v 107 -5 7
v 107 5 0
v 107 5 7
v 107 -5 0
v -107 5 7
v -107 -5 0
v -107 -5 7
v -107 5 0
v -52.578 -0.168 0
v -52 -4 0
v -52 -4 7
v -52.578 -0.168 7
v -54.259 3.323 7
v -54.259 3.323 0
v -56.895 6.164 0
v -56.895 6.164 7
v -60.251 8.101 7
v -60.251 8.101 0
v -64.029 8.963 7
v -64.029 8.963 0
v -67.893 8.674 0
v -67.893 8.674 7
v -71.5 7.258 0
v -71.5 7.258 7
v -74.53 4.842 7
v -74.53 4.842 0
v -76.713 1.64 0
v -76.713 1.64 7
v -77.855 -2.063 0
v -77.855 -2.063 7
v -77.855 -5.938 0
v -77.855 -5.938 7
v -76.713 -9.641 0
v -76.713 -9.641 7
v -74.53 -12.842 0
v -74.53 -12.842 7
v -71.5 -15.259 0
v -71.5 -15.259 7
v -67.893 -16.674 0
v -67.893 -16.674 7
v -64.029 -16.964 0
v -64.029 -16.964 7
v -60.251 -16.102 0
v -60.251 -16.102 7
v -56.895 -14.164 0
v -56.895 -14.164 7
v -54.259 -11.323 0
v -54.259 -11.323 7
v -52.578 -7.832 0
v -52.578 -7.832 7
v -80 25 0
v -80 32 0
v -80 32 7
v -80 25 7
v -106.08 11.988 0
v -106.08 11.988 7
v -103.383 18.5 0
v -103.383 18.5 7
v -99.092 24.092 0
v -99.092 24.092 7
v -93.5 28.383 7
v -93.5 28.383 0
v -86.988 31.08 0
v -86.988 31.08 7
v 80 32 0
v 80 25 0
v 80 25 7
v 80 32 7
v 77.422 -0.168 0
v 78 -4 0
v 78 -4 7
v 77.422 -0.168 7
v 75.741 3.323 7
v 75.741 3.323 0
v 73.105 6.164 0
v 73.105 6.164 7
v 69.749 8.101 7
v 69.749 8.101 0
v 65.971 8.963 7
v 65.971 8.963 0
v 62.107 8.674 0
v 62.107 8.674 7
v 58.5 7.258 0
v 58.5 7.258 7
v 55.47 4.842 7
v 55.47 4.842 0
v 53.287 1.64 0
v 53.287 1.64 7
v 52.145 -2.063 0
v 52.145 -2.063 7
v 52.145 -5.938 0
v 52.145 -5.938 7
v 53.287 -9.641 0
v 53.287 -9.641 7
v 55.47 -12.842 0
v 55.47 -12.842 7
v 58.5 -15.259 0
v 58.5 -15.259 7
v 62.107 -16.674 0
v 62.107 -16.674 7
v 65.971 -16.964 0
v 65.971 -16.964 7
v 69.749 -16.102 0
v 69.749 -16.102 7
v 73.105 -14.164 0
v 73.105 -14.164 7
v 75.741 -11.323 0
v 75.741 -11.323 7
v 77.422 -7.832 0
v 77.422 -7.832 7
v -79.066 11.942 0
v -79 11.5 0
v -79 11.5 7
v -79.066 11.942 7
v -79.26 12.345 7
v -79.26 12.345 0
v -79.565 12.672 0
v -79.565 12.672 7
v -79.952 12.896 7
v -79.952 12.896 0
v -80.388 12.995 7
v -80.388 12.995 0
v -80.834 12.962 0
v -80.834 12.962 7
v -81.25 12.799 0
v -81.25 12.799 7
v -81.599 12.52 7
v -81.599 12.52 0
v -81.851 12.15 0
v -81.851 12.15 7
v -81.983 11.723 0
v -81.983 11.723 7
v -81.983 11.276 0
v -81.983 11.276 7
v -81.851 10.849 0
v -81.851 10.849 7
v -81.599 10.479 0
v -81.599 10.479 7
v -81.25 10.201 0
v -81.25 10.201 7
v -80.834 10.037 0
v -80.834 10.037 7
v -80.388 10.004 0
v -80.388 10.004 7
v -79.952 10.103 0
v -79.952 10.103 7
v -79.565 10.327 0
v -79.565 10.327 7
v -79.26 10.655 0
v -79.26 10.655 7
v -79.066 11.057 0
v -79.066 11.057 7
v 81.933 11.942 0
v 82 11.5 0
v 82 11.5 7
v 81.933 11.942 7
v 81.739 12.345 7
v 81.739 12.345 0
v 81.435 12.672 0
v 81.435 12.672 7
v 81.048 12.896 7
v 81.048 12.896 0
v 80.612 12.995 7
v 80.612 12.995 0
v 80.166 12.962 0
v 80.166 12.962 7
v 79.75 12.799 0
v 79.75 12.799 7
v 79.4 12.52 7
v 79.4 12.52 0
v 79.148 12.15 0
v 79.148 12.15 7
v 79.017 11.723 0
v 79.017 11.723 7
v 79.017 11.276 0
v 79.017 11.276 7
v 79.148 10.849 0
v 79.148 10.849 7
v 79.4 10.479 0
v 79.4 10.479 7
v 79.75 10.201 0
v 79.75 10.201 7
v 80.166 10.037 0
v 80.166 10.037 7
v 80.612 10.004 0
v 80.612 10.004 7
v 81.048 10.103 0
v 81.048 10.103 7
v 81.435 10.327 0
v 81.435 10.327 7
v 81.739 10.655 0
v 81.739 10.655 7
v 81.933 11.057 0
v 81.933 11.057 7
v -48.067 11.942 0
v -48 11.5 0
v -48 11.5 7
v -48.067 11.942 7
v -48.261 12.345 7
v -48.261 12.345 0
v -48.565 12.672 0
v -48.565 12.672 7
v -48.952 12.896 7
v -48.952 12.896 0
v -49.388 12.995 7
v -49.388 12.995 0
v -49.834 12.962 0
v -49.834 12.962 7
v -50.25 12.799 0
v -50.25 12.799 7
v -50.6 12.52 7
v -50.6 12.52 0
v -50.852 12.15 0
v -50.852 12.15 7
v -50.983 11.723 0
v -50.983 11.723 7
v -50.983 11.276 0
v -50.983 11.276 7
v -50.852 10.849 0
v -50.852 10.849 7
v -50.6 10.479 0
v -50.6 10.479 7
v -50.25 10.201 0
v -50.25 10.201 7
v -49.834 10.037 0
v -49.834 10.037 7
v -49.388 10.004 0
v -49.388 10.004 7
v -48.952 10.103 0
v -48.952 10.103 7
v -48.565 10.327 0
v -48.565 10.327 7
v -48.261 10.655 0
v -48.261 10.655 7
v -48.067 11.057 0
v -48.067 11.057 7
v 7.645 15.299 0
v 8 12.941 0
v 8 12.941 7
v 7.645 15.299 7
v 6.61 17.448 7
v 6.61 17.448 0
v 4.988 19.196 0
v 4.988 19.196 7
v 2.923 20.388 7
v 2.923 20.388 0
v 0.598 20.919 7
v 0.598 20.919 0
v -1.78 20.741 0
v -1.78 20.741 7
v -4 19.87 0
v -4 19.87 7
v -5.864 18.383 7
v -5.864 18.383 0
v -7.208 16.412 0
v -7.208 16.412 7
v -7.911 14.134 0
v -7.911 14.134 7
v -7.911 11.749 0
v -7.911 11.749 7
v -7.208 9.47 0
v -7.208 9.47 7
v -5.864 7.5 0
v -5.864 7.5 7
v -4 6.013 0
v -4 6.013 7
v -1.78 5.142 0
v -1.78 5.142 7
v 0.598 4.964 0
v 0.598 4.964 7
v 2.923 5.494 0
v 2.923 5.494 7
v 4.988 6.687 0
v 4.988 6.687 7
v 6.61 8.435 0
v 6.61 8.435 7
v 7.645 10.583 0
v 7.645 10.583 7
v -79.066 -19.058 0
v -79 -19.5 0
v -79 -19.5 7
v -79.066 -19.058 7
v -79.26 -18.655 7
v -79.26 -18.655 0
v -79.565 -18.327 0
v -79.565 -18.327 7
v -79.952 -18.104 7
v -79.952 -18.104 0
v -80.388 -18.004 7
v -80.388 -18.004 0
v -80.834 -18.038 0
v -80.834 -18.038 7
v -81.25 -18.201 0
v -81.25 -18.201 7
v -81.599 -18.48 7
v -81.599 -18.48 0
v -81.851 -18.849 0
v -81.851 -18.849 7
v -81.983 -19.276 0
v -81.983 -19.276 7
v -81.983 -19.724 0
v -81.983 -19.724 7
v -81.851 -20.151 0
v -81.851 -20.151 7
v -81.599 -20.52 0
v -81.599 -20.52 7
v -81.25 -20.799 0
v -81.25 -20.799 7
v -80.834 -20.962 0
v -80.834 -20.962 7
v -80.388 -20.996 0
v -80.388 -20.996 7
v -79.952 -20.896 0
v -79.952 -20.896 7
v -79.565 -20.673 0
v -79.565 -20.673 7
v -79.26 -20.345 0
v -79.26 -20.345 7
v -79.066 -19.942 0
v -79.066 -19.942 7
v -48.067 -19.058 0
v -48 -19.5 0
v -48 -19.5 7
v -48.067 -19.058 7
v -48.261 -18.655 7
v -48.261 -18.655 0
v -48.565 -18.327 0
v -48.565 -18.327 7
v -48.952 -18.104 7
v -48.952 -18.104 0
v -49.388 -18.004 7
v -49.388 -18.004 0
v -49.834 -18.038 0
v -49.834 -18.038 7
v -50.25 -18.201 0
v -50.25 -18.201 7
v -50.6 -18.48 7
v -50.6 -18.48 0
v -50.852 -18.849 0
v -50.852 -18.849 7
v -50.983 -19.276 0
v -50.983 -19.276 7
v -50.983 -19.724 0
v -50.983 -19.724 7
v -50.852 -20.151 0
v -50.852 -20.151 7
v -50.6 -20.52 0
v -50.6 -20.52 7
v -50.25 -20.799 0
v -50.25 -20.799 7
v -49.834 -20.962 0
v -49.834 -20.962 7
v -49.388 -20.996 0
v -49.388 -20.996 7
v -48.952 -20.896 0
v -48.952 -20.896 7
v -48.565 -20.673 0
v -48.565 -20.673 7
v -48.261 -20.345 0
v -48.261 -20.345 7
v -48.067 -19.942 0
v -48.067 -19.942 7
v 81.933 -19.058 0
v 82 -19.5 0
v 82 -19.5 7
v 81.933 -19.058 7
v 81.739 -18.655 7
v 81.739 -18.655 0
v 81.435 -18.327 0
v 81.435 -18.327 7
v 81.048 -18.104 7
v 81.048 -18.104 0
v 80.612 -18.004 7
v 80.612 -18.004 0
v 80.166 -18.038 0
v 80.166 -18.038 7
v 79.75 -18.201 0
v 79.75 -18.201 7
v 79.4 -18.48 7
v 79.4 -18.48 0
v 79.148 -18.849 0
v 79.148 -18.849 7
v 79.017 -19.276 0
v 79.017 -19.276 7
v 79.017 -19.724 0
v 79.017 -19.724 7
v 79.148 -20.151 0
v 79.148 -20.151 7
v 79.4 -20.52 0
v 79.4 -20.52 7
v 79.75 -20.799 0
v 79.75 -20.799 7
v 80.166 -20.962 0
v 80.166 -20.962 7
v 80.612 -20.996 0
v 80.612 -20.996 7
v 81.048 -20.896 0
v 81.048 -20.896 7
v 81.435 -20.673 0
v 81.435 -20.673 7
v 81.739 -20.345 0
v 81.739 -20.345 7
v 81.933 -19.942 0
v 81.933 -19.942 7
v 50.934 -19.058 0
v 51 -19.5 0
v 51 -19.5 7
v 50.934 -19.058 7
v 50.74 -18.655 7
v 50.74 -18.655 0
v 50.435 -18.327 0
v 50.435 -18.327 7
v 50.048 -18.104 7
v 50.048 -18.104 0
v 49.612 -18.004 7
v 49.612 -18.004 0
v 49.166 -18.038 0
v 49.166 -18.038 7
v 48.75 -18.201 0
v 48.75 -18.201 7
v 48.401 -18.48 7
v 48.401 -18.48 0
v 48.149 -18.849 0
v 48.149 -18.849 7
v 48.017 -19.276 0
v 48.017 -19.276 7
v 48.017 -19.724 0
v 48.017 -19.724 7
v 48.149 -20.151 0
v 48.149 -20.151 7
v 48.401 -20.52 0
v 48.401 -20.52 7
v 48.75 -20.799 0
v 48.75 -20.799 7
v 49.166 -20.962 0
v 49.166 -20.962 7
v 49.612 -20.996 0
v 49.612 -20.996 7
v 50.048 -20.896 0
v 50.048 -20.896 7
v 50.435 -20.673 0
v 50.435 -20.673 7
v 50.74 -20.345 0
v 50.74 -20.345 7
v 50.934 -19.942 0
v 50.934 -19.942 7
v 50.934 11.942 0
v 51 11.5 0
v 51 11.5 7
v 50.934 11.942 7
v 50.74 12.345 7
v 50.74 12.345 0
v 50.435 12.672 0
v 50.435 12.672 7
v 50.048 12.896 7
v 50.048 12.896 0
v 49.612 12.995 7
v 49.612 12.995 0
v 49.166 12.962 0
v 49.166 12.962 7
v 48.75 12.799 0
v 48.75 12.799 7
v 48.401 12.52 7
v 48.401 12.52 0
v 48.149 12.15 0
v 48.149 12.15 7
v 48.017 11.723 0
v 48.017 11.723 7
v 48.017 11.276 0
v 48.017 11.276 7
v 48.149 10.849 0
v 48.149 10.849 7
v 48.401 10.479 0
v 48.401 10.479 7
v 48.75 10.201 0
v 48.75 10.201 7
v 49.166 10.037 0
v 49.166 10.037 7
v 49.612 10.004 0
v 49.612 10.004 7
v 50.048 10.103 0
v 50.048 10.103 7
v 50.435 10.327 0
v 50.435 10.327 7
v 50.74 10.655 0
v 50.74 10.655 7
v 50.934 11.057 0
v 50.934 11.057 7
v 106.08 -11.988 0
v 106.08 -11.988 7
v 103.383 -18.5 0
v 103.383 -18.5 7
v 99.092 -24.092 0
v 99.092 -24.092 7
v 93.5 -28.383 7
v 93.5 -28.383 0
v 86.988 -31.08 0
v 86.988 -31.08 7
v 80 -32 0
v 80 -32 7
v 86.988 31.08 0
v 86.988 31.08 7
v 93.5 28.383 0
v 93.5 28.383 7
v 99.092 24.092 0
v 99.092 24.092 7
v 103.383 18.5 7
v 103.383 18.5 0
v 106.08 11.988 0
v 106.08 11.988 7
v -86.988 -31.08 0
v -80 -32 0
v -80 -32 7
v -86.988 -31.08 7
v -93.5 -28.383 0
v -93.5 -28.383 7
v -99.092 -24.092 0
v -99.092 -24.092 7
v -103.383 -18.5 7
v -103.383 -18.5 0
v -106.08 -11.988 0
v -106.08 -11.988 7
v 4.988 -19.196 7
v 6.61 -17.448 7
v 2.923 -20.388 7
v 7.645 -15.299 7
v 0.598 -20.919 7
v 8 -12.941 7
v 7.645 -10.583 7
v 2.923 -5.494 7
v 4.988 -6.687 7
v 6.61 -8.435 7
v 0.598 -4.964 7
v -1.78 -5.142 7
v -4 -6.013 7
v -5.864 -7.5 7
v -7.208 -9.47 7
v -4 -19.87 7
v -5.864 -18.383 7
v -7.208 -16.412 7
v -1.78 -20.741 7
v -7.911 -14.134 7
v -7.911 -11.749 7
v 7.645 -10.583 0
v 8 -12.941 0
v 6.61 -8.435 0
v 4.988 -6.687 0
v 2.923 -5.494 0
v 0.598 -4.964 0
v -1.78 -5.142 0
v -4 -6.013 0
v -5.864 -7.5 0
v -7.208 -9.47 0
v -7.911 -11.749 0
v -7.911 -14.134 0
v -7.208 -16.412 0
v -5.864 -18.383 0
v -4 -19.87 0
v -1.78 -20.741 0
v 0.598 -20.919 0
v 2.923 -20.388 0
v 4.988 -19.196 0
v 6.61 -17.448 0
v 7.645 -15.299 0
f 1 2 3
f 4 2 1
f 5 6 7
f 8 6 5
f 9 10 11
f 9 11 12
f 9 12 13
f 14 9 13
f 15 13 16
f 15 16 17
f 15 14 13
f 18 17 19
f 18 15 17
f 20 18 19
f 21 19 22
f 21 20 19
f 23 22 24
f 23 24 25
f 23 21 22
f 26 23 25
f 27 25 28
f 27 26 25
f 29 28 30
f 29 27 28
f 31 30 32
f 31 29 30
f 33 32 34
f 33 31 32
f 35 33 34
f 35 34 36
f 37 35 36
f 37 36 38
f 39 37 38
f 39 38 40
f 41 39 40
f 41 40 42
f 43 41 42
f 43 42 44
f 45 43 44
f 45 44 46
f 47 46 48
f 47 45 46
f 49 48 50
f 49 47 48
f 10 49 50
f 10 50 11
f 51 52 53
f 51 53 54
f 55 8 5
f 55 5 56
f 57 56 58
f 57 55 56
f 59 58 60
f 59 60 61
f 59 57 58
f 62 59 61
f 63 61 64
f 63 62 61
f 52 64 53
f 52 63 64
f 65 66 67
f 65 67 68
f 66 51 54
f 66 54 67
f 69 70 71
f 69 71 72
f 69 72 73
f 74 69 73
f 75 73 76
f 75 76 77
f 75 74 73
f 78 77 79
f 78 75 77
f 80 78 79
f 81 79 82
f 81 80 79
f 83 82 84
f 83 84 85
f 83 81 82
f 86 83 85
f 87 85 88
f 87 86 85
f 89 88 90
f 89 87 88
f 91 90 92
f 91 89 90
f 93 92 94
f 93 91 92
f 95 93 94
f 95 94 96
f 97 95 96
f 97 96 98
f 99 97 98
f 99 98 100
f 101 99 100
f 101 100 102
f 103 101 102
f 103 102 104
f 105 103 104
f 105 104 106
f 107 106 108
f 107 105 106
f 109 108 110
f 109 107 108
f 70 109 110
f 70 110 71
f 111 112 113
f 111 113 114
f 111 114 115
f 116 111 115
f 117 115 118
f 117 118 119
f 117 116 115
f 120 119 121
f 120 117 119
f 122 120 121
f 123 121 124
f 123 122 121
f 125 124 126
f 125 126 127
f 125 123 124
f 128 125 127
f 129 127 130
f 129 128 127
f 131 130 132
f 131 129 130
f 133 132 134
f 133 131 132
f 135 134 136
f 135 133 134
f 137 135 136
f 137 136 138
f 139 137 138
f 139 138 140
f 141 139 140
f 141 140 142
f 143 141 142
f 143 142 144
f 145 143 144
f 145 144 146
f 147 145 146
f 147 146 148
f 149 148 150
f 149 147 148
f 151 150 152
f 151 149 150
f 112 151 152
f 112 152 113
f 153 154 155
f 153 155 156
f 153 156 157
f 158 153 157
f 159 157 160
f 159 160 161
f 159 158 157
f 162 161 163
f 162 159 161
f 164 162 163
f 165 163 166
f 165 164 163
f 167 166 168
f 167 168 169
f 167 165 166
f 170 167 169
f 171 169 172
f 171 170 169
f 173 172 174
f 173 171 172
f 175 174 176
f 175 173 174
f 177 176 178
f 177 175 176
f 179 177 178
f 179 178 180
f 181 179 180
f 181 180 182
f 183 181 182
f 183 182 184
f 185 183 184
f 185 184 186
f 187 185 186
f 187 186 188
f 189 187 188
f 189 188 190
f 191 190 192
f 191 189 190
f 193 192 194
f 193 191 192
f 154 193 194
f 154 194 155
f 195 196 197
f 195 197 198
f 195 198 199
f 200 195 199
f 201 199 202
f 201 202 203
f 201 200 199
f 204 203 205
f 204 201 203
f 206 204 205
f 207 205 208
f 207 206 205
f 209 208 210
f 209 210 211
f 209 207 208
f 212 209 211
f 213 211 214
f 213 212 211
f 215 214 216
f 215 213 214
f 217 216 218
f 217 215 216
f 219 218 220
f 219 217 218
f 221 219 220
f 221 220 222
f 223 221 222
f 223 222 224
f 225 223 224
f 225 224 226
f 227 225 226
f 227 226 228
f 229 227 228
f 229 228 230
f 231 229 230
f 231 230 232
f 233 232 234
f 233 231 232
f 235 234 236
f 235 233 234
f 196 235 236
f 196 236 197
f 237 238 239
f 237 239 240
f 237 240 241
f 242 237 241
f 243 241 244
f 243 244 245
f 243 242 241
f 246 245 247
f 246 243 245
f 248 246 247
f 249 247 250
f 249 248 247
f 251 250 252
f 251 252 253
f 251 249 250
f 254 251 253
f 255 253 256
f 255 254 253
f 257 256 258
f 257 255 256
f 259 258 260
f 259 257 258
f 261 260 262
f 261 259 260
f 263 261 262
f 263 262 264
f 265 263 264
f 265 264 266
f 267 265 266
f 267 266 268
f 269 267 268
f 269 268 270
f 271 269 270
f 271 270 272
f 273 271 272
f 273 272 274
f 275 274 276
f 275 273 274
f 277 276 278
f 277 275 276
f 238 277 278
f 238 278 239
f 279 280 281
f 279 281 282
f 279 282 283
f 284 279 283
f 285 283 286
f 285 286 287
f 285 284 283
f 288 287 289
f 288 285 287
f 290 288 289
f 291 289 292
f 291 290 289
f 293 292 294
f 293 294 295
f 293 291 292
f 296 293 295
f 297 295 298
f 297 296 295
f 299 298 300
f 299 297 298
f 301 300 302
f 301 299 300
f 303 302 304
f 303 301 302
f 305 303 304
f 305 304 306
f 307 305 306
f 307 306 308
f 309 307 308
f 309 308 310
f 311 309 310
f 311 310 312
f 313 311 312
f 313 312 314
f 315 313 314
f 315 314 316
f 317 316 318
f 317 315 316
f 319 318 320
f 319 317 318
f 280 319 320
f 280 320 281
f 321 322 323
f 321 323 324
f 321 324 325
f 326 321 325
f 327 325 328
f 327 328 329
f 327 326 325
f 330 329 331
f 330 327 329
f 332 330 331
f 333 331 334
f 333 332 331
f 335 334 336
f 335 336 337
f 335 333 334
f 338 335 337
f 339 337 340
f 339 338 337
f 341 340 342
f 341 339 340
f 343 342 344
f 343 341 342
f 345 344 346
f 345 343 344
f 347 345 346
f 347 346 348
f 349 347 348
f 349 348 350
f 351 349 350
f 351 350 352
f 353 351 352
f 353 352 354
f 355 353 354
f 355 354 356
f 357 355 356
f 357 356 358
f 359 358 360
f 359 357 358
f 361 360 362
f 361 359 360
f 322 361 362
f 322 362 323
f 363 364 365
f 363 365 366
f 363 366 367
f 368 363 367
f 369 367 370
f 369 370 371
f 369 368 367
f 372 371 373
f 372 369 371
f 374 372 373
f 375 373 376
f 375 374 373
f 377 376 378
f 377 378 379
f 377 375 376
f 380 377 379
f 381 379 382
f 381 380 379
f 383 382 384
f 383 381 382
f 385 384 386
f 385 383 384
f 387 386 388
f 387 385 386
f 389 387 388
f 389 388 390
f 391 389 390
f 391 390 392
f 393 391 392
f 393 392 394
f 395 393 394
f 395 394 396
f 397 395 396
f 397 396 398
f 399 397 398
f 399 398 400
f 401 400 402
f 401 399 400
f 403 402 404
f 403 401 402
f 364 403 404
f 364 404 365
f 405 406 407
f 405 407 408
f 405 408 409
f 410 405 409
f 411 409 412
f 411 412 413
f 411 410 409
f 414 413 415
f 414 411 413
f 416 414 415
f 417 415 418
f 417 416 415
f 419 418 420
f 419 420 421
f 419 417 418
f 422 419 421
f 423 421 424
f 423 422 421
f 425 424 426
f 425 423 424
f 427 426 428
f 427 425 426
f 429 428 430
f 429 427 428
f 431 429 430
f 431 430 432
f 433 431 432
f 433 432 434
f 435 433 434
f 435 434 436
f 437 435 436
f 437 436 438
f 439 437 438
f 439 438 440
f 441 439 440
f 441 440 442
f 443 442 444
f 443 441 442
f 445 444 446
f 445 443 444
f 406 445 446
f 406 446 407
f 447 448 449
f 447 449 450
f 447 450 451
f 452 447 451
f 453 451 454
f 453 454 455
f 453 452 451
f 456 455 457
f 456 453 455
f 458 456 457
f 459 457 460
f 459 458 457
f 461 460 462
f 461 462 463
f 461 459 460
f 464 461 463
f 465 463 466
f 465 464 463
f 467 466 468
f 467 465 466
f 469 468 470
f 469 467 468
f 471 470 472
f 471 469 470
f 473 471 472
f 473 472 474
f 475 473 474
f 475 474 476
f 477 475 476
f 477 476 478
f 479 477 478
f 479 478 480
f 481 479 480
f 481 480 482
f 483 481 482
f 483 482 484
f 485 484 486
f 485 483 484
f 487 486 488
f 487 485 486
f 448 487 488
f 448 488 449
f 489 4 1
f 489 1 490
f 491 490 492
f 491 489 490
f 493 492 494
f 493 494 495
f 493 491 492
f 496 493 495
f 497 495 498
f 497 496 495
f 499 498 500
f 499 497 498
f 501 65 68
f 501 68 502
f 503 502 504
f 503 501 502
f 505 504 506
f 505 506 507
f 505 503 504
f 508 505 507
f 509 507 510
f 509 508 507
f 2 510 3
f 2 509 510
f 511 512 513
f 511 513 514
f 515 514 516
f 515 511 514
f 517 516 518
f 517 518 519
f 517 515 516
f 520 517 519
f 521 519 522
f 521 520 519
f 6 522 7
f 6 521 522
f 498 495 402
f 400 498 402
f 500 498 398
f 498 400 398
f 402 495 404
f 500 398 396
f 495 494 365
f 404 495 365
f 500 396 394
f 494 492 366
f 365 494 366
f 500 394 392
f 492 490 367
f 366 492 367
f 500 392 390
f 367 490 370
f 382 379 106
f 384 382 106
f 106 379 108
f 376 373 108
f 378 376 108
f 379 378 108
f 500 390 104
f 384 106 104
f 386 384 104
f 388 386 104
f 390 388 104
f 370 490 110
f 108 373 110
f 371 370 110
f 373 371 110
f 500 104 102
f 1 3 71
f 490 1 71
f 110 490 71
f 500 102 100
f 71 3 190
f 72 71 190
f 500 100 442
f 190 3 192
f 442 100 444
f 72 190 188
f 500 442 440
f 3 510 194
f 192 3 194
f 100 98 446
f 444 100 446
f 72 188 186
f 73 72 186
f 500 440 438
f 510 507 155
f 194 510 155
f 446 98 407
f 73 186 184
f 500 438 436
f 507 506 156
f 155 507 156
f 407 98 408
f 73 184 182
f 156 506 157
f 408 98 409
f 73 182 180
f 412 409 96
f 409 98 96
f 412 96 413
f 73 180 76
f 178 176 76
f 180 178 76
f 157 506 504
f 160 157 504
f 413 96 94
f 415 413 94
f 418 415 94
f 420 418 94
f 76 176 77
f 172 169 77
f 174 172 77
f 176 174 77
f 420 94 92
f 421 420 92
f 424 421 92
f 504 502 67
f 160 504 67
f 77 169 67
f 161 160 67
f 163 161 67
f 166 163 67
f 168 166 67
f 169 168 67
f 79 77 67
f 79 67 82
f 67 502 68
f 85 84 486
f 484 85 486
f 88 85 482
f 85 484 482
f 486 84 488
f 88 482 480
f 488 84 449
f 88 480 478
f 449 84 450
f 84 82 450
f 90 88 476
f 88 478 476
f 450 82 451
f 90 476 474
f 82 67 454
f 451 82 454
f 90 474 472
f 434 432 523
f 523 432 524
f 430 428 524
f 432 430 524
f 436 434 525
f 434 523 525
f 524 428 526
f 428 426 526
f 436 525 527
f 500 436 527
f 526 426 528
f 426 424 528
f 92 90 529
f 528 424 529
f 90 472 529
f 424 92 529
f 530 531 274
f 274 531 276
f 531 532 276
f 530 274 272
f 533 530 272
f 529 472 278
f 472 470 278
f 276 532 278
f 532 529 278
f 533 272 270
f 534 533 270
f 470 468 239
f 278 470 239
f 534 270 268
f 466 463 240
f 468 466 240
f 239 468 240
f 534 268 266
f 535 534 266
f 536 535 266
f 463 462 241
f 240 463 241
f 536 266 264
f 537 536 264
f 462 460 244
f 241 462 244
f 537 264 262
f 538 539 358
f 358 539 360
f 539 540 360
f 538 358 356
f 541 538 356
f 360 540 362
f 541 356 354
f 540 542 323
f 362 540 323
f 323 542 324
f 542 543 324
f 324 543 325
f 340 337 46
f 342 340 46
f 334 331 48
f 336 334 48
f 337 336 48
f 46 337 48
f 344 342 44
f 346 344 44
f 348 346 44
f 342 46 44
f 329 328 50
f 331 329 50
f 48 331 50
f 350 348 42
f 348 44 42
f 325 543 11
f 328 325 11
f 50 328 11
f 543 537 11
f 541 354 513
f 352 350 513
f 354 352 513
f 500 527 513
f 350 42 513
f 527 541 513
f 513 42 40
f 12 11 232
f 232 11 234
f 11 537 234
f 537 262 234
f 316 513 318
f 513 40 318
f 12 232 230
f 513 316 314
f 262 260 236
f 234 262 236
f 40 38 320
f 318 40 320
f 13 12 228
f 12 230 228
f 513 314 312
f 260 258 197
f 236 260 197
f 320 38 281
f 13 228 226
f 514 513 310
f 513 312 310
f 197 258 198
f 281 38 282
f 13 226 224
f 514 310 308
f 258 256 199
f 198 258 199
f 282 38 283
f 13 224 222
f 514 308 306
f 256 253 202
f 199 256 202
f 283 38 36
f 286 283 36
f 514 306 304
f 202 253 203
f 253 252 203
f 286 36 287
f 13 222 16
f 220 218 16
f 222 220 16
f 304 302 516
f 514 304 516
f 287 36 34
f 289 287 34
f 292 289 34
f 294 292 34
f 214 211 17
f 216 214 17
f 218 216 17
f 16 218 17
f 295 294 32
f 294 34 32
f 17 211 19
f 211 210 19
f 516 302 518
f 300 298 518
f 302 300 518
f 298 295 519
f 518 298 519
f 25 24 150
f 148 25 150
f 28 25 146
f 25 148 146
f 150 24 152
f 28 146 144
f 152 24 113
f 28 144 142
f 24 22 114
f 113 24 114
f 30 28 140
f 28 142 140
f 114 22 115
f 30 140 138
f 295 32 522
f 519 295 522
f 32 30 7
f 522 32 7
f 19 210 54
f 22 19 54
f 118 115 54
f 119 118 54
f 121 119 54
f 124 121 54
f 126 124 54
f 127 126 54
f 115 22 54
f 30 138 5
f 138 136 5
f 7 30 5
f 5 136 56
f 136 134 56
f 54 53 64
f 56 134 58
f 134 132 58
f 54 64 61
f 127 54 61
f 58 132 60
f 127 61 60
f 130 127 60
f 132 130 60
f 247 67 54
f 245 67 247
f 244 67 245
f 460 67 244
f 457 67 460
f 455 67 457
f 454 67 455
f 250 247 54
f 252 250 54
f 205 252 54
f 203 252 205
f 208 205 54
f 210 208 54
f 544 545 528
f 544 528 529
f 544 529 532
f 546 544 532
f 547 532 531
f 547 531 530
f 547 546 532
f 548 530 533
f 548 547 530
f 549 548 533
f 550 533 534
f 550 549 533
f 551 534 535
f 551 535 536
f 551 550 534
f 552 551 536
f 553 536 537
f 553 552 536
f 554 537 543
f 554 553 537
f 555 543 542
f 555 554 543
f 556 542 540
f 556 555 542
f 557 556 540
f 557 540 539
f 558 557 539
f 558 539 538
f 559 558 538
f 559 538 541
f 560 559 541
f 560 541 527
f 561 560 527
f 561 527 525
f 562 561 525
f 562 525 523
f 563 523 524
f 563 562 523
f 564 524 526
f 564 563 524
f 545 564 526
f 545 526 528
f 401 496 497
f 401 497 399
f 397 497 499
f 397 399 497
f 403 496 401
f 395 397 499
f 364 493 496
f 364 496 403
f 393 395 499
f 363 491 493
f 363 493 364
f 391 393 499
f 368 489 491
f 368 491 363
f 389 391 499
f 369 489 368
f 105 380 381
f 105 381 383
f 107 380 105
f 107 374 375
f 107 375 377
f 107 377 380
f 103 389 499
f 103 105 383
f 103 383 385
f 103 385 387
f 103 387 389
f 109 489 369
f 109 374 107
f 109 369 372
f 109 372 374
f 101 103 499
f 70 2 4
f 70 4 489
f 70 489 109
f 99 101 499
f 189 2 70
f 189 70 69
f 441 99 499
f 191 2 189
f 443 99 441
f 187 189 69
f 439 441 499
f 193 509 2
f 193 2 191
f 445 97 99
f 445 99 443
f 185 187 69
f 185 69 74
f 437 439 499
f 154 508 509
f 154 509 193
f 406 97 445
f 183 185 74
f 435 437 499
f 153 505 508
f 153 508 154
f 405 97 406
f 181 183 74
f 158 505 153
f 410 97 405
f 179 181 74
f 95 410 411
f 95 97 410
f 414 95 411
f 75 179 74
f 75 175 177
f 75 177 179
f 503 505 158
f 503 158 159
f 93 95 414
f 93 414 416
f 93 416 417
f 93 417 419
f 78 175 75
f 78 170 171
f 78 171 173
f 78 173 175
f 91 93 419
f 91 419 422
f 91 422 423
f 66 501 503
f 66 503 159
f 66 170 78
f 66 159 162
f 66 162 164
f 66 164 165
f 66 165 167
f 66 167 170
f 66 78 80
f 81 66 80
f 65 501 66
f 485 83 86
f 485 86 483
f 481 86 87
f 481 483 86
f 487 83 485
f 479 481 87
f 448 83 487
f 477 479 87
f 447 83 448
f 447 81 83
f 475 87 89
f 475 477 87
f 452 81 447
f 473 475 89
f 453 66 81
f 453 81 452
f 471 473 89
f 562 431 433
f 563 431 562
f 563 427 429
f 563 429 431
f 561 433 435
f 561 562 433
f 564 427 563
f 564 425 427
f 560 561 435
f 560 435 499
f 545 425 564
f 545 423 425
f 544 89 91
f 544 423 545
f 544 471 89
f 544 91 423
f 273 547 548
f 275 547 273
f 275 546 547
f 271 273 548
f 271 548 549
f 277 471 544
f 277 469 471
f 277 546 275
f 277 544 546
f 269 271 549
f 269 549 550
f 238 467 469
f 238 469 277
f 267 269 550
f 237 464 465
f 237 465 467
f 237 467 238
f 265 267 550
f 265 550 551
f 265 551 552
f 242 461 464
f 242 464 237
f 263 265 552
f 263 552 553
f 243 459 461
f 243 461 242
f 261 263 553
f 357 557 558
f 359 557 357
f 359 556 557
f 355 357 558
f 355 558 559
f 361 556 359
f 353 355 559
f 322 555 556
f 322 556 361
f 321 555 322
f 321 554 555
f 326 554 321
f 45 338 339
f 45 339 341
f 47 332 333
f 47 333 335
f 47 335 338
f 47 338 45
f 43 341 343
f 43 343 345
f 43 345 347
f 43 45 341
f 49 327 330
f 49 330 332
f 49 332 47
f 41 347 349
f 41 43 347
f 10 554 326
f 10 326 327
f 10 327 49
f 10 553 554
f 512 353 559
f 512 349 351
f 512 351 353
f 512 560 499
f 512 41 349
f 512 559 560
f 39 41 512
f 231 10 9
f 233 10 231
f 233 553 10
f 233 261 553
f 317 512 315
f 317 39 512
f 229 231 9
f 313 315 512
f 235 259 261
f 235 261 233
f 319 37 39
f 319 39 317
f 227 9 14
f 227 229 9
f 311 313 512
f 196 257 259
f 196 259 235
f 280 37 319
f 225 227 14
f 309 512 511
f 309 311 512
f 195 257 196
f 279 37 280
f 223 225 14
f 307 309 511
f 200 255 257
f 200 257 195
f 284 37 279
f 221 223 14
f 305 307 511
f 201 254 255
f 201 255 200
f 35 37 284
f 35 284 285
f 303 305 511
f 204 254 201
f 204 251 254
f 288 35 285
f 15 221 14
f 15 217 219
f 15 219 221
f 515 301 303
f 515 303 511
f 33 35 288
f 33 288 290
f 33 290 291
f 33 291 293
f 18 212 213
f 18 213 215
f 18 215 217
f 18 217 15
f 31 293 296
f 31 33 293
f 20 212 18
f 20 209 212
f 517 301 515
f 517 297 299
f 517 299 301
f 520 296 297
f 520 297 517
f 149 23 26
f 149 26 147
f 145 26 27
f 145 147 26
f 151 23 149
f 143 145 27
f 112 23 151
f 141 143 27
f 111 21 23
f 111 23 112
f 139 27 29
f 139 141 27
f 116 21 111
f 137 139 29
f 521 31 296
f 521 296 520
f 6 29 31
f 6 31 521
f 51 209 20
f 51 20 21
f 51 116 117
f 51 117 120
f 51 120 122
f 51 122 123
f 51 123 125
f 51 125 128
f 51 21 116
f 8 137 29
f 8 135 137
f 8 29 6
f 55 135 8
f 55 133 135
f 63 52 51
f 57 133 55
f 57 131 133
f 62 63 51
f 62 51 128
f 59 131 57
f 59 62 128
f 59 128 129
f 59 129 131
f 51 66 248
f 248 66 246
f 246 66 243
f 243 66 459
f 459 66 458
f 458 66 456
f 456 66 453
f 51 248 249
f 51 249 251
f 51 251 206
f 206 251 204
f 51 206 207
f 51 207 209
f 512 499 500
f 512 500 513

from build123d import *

# Parameters (mm, degrees)
SCHIZZO1_R                   = 13
SCHIZZO1_R_2                 = 1.5
SCHIZZO1_R_3                 = 8
ESTRUSIONE_ESTRUSIONE1_DEPTH = 7


with BuildPart() as part:
    # Schizzo1 → Estrusione-Estrusione1 (new body)
    with BuildSketch(Plane.XY):
        with BuildLine():
            Line((-80, 32), (-80, 25))
            Line((-80, 25), (80, 25))
            Line((80, 25), (80, 32))
            ThreePointArc((80, 32), (99.091883092, 24.091883092), (107, 5))
            Line((107, 5), (107, -5))
            ThreePointArc((107, -5), (99.091883092, -24.091883092), (80, -32))
            Line((80, -32), (-80, -32))
            ThreePointArc((-80, -32), (-99.091883092, -24.091883092), (-107, -5))
            Line((-107, -5), (-107, 5))
            ThreePointArc((-107, 5), (-99.091883092, 24.091883092), (-80, 32))
        make_face()
        with Locations((-65, -4.000219356)):
            Circle(SCHIZZO1_R, mode=Mode.SUBTRACT)
        with Locations((-80.499780644, 11.499561287)):
            Circle(SCHIZZO1_R_2, mode=Mode.SUBTRACT)
        with Locations((-80.499780644, -19.5)):
            Circle(SCHIZZO1_R_2, mode=Mode.SUBTRACT)
        with Locations((-49.500219356, -19.5)):
            Circle(SCHIZZO1_R_2, mode=Mode.SUBTRACT)
        with Locations((-49.500219356, 11.499561287)):
            Circle(SCHIZZO1_R_2, mode=Mode.SUBTRACT)
        with Locations((65, -4.000219356)):
            Circle(SCHIZZO1_R, mode=Mode.SUBTRACT)
        with Locations((49.500219356, -19.5)):
            Circle(SCHIZZO1_R_2, mode=Mode.SUBTRACT)
        with Locations((80.499780644, -19.5)):
            Circle(SCHIZZO1_R_2, mode=Mode.SUBTRACT)
        with Locations((80.499780644, 11.499561287)):
            Circle(SCHIZZO1_R_2, mode=Mode.SUBTRACT)
        with Locations((49.500219356, 11.499561287)):
            Circle(SCHIZZO1_R_2, mode=Mode.SUBTRACT)
        with Locations((0, 12.9413)):
            Circle(SCHIZZO1_R_3, mode=Mode.SUBTRACT)
        with Locations((0, -12.9413)):
            Circle(SCHIZZO1_R_3, mode=Mode.SUBTRACT)
    extrude(amount=ESTRUSIONE_ESTRUSIONE1_DEPTH)


solid = part.part
